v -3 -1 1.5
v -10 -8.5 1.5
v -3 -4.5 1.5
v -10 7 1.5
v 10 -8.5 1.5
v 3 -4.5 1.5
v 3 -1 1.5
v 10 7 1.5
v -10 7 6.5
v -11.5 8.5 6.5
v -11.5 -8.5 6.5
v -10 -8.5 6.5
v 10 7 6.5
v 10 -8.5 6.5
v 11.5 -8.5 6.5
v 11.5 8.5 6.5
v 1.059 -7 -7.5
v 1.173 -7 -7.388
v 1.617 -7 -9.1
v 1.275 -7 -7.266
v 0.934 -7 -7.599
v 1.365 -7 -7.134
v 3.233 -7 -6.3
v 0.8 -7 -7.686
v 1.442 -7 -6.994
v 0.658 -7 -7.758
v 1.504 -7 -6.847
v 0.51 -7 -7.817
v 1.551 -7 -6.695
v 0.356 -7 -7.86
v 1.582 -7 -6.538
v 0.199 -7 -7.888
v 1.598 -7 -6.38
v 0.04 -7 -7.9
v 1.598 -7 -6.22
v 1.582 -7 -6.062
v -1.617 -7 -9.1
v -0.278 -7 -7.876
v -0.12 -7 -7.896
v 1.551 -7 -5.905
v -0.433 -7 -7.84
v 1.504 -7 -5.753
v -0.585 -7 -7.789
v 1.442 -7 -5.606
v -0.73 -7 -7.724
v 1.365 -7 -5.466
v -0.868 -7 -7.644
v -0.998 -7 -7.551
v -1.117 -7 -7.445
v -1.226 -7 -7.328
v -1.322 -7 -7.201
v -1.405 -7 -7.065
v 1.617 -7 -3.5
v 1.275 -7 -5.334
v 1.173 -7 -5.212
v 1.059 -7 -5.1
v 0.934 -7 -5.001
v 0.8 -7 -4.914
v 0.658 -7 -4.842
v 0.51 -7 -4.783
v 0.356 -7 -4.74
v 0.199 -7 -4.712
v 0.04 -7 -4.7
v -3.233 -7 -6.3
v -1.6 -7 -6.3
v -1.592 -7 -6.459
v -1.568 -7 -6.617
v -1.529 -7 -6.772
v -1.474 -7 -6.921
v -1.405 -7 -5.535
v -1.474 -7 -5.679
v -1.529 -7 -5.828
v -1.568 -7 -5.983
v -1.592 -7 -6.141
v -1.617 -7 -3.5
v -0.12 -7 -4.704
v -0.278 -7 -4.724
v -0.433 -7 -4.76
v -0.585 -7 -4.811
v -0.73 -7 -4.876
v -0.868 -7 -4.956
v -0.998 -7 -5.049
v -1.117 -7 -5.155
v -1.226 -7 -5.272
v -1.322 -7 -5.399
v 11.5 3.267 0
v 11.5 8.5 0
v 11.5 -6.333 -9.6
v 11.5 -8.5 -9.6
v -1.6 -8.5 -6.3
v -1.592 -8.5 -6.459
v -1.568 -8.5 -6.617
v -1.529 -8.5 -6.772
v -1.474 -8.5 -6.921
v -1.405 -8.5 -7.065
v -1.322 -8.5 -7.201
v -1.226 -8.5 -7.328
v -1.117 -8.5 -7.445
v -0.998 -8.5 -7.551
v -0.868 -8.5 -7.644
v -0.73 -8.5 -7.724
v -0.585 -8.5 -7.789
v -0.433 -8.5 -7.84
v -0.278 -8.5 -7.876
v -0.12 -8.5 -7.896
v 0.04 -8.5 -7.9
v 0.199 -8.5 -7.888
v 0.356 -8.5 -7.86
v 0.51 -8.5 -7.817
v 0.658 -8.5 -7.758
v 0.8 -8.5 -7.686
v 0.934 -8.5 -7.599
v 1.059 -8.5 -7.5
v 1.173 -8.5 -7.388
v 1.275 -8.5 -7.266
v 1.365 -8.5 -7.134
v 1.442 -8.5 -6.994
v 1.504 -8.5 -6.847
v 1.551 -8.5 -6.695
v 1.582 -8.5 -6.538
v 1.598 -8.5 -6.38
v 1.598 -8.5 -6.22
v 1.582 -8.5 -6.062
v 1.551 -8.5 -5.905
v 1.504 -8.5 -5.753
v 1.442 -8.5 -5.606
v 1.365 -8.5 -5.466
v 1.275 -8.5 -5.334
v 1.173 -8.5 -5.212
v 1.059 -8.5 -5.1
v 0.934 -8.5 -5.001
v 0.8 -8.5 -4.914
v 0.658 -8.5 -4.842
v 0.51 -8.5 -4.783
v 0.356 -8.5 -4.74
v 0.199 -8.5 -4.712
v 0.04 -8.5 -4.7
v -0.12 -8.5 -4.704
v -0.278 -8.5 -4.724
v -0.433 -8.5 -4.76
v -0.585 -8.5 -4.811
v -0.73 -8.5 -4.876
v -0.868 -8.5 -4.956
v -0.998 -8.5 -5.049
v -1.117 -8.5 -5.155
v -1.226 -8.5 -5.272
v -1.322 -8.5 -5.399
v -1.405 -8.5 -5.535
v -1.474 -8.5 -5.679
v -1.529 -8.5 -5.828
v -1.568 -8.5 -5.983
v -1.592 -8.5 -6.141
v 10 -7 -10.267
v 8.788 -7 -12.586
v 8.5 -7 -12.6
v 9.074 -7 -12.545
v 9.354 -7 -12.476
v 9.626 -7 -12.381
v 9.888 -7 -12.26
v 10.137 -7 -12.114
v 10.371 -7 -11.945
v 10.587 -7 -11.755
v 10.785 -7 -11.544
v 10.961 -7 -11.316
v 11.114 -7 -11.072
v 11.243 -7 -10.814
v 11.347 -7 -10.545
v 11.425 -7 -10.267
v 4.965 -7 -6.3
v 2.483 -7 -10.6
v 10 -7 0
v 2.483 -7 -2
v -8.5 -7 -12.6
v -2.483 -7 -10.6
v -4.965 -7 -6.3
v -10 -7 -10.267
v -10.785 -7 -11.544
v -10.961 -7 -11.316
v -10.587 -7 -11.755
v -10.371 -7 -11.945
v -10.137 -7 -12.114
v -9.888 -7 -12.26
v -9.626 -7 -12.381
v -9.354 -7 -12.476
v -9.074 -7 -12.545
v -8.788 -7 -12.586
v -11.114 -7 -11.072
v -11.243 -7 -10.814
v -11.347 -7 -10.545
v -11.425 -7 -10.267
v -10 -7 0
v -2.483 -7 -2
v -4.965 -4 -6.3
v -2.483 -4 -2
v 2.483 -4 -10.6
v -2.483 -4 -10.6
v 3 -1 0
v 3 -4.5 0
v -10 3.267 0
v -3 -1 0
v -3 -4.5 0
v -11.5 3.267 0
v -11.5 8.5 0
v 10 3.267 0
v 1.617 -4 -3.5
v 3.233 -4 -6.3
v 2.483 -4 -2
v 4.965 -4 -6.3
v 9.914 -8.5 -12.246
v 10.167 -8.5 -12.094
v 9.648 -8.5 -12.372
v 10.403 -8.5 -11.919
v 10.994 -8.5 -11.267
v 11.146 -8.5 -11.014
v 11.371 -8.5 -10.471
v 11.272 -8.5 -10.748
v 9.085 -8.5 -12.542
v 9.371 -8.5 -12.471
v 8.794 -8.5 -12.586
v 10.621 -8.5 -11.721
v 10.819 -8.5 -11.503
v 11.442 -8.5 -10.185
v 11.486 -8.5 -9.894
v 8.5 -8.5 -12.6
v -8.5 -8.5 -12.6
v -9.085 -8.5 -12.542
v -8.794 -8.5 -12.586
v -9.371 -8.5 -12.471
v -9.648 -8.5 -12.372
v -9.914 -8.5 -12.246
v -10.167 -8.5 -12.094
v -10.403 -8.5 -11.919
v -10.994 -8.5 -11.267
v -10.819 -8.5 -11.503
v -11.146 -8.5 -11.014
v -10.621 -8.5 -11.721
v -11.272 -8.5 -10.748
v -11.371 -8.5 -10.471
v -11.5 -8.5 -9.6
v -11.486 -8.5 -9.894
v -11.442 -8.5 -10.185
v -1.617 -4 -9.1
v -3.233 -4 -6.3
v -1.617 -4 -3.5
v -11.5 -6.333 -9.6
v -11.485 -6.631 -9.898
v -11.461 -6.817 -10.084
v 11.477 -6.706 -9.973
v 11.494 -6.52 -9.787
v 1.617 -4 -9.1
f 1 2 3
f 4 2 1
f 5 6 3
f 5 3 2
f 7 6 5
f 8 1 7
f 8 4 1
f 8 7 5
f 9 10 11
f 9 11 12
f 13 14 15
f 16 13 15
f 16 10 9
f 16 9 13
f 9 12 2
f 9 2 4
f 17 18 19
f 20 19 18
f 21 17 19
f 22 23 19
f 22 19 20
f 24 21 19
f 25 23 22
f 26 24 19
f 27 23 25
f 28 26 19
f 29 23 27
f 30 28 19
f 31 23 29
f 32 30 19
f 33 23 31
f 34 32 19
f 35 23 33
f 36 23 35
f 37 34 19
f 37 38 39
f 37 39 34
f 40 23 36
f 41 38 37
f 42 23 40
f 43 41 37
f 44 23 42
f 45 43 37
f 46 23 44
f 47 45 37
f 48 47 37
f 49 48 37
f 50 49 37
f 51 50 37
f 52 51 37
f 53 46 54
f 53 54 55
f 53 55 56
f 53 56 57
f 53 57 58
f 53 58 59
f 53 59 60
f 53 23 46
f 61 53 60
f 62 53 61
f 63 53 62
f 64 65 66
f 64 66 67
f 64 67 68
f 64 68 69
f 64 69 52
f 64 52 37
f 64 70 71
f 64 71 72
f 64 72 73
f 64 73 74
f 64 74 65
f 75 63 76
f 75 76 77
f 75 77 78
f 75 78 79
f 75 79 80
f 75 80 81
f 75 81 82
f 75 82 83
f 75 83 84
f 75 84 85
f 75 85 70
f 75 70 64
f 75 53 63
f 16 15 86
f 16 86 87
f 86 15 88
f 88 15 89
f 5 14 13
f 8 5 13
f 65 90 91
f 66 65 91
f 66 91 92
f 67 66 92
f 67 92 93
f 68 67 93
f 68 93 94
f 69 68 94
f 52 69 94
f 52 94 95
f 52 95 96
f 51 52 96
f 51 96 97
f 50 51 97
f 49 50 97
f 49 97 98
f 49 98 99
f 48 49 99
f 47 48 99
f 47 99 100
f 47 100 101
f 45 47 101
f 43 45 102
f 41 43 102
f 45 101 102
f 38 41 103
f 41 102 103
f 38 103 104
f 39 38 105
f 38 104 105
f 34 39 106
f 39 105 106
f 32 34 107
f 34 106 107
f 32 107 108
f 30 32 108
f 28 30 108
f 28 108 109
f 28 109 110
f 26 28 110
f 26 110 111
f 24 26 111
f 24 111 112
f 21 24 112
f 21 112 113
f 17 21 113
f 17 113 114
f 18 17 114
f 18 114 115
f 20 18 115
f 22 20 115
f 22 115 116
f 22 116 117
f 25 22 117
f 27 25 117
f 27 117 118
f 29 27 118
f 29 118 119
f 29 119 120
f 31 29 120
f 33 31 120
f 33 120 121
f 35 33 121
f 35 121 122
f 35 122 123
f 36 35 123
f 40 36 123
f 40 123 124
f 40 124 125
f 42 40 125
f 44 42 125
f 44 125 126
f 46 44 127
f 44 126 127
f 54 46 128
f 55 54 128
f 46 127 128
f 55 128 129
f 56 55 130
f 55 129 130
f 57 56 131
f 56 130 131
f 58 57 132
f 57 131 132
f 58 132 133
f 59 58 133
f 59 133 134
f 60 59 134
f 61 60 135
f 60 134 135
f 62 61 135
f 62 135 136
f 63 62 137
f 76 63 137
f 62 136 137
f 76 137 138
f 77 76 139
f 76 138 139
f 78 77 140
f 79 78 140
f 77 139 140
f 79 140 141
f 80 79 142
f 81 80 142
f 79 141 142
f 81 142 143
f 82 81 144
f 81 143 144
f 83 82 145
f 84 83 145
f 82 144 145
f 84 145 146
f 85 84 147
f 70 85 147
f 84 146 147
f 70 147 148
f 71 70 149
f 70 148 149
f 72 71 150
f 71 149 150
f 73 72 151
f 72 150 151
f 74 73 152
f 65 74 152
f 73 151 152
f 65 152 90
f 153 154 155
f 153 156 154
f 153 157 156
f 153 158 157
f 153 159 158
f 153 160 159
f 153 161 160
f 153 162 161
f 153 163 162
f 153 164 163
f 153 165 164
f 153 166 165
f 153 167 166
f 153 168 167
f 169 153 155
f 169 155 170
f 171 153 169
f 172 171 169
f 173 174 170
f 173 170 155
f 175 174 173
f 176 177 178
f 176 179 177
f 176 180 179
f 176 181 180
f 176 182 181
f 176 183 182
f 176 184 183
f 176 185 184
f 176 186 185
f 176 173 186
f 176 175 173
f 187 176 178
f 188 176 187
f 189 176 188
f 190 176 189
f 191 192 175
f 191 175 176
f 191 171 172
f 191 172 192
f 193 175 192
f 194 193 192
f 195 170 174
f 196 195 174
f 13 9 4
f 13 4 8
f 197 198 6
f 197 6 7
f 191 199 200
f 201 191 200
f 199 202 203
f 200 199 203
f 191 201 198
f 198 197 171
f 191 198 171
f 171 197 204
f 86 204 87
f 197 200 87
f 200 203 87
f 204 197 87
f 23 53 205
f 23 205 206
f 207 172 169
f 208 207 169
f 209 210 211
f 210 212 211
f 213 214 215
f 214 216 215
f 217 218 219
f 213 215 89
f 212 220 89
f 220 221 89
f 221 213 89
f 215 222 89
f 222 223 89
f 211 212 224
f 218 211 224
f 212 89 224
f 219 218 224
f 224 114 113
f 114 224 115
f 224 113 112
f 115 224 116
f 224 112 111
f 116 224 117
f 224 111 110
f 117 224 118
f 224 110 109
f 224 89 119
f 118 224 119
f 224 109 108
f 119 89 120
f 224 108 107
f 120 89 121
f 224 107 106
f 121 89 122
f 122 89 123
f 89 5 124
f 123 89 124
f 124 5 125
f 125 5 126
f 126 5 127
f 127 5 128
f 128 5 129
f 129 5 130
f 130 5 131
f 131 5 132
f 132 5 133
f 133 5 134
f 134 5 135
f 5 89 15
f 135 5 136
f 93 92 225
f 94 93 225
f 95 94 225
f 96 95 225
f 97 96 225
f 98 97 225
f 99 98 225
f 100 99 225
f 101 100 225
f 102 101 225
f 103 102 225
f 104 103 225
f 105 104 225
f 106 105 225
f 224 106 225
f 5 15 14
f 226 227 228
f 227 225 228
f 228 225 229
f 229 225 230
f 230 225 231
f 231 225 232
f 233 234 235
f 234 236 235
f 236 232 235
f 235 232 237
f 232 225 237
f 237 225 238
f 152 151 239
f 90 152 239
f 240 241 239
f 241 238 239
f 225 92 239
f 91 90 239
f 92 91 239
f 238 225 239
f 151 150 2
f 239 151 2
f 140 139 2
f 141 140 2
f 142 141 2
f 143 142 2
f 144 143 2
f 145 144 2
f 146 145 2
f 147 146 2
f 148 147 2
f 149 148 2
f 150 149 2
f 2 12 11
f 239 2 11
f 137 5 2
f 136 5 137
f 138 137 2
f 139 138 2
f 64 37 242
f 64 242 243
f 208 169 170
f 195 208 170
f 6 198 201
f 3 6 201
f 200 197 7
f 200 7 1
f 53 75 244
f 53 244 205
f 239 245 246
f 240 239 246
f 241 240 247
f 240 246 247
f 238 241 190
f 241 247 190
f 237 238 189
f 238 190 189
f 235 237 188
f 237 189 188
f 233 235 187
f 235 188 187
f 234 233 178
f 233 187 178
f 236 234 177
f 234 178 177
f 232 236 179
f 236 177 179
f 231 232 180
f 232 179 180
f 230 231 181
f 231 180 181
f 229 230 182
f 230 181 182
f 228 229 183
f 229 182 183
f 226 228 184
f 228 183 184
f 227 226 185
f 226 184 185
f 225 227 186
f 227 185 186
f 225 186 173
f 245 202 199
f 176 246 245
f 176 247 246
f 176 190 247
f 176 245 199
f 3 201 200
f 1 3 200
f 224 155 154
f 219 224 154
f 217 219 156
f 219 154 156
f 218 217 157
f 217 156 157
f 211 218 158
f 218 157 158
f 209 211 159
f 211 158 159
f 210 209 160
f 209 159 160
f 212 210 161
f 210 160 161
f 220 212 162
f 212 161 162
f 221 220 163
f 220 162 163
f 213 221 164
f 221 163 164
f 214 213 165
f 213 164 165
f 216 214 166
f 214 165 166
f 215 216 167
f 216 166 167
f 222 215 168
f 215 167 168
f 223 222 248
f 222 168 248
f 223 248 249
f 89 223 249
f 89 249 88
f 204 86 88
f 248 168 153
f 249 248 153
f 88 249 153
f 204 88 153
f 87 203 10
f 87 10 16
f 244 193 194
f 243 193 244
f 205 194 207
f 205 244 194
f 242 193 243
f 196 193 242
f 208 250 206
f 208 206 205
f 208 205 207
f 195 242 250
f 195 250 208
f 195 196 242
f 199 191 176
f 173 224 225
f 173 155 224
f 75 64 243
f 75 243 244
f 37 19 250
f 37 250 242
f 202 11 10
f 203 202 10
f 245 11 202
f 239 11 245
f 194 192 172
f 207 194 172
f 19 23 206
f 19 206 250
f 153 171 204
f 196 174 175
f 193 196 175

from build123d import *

# Parameters (mm, degrees)
SKETCH_1_W                  = 23
SKETCH_1_H                  = 17
EXTRUDE_1_DEPTH             = 6.5
SKETCH_2_W                  = 20
SKETCH_2_H                  = 15.5
CUT_EXTRUDE_1_DEPTH         = 5
SKETCH_3_W                  = 23
SKETCH_3_H                  = 1.5
EXTRUDE_2_DEPTH             = 12.6
EXTRUDE_3_DEPTH             = 3
EXTRUDE_6_REACH             = 21.397
SKETCH_7_W                  = 1.5
SKETCH_7_H                  = 7.259859141
EXTRUDE_6_DIRECTION_2_REACH = 21.397
HOLE_WIZARD_M3_1_D          = 3.2
FILLET_1_R                  = 3
CUT_EXTRUDE_2_REACH         = 21.059
SKETCH_10_W                 = 6
SKETCH_10_H                 = 3.5


with BuildPart() as part:
    # 草图1 → 凸台-拉伸1 (new body)
    with BuildSketch(Plane.XY):
        Rectangle(SKETCH_1_W, SKETCH_1_H)
    extrude(amount=EXTRUDE_1_DEPTH)

    # 草图2 → 切除-拉伸1 (cut)
    with BuildSketch(Plane.XY.offset(6.5)):
        with Locations((0, -0.75)):
            Rectangle(SKETCH_2_W, SKETCH_2_H)
    extrude(amount=-CUT_EXTRUDE_1_DEPTH, mode=Mode.SUBTRACT)

    # 草图3 → 凸台-拉伸2 (add)
    with BuildSketch(Plane(origin=(0, 0, 0), x_dir=(-1, 0, 0), z_dir=(0, 0, -1))):
        with Locations((0, -7.75)):
            Rectangle(SKETCH_3_W, SKETCH_3_H)
    extrude(amount=EXTRUDE_2_DEPTH)

    # 草图4 → 凸台-拉伸3 (add)
    with BuildSketch(Plane(origin=(0, -7, 0), x_dir=(1, 0, 0), z_dir=(0, 1, 0))):
        Polygon((4.965212315, 6.3), (2.482606158, 10.6), (-2.482606158, 10.6), (-4.965212315, 6.3), (-2.482606158, 2), (2.482606158, 2), align=None)
        Polygon((3.233161507, 6.3), (1.616580754, 9.1), (-1.616580754, 9.1), (-3.233161507, 6.3), (-1.616580754, 3.5), (1.616580754, 3.5), align=None, mode=Mode.SUBTRACT)
    extrude(amount=EXTRUDE_3_DEPTH)

    # 凸台-拉伸6: up to this face of the body (flat: up to its plane)
    extrude_6_end = Plane(part.part.faces().sort_by_distance((0, -7, -6.3))[0])
    # 草图7 → 凸台-拉伸6 (add, up to the picked face)
    with BuildSketch(Plane(origin=(0, -3.5, -3.5), x_dir=(-1, 0, 0), z_dir=(0, -0.7071067811865475, -0.7071067811865477)), mode=Mode.PRIVATE) as extrude_6_sk1:
        with Locations((-10.75, -1.319817897)):
            Rectangle(SKETCH_7_W, SKETCH_7_H)
    extrude_6_tool1 = split(extrude(extrude_6_sk1.sketch, amount=EXTRUDE_6_REACH, mode=Mode.PRIVATE), bisect_by=extrude_6_end, keep=Keep.BOTH, mode=Mode.PRIVATE)
    extrude_6 = extrude_6_tool1.solids().sort_by(Axis((10.75, -4.433252, -2.566748), (0, -0.7071067811865475, -0.7071067811865477)))[0]
    add(extrude_6)

    # 凸台-拉伸6 direction 2: up to this face of the body (flat: up to its plane)
    extrude_6_direction_2_end = Plane(part.part.faces().sort_by_distance((0, 0.75, 0))[0])
    # 草图7 → 凸台-拉伸6 direction 2 (add, up to the picked face)
    with BuildSketch(Plane(origin=(0, -3.5, -3.5), x_dir=(-1, 0, 0), z_dir=(0, -0.7071067811865475, -0.7071067811865477)), mode=Mode.PRIVATE) as extrude_6_direction_2_sk1:
        with Locations((-10.75, -1.319817897)):
            Rectangle(SKETCH_7_W, SKETCH_7_H)
    extrude_6_direction_2_tool1 = split(extrude(extrude_6_direction_2_sk1.sketch, amount=-EXTRUDE_6_DIRECTION_2_REACH, mode=Mode.PRIVATE), bisect_by=extrude_6_direction_2_end, keep=Keep.BOTH, mode=Mode.PRIVATE)
    extrude_6_direction_2 = extrude_6_direction_2_tool1.solids().sort_by(Axis((10.75, -4.433252, -2.566748), (0, 0.7071067811865475, 0.7071067811865477)))[0]
    add(extrude_6_direction_2)

    # 镜向1: 凸台-拉伸6, 凸台-拉伸6 direction 2 across plane
    add(extrude_6.mirror(Plane(origin=(0, 0, 0), x_dir=(0, 0, 1), z_dir=(1, 0, 0))))
    add(extrude_6_direction_2.mirror(Plane(origin=(0, 0, 0), x_dir=(0, 0, 1), z_dir=(1, 0, 0))))

    # M3 间隙孔1 (through all)
    with Locations(Plane(origin=(0, -7, 0), x_dir=(1, 0, 0), z_dir=(0, 1, 0))):
        with Locations((0, 6.3)):
            Hole(HOLE_WIZARD_M3_1_D / 2)

    # 圆角1
    fillet_1_edges = [part.edges().sort_by_distance(p)[0] for p in [
        (-11.5, -7.75, -12.6),
        (11.5, -7.75, -12.6),
    ]]
    fillet(fillet_1_edges, radius=FILLET_1_R)

    # 草图10 → 切除-拉伸2 (cut, up to next)
    with BuildSketch(Plane(origin=(0, 0, 0), x_dir=(-1, 0, 0), z_dir=(0, 0, -1)), mode=Mode.PRIVATE) as cut_extrude_2_sk1:
        with Locations((0, -2.75)):
            Rectangle(SKETCH_10_W, SKETCH_10_H)
    cut_extrude_2_tool1 = extrude(cut_extrude_2_sk1.sketch, amount=-CUT_EXTRUDE_2_REACH, mode=Mode.PRIVATE) & part.part
    add(cut_extrude_2_tool1.solids().sort_by_distance((0, -2.75, 0))[0], mode=Mode.SUBTRACT)


solid = part.part
